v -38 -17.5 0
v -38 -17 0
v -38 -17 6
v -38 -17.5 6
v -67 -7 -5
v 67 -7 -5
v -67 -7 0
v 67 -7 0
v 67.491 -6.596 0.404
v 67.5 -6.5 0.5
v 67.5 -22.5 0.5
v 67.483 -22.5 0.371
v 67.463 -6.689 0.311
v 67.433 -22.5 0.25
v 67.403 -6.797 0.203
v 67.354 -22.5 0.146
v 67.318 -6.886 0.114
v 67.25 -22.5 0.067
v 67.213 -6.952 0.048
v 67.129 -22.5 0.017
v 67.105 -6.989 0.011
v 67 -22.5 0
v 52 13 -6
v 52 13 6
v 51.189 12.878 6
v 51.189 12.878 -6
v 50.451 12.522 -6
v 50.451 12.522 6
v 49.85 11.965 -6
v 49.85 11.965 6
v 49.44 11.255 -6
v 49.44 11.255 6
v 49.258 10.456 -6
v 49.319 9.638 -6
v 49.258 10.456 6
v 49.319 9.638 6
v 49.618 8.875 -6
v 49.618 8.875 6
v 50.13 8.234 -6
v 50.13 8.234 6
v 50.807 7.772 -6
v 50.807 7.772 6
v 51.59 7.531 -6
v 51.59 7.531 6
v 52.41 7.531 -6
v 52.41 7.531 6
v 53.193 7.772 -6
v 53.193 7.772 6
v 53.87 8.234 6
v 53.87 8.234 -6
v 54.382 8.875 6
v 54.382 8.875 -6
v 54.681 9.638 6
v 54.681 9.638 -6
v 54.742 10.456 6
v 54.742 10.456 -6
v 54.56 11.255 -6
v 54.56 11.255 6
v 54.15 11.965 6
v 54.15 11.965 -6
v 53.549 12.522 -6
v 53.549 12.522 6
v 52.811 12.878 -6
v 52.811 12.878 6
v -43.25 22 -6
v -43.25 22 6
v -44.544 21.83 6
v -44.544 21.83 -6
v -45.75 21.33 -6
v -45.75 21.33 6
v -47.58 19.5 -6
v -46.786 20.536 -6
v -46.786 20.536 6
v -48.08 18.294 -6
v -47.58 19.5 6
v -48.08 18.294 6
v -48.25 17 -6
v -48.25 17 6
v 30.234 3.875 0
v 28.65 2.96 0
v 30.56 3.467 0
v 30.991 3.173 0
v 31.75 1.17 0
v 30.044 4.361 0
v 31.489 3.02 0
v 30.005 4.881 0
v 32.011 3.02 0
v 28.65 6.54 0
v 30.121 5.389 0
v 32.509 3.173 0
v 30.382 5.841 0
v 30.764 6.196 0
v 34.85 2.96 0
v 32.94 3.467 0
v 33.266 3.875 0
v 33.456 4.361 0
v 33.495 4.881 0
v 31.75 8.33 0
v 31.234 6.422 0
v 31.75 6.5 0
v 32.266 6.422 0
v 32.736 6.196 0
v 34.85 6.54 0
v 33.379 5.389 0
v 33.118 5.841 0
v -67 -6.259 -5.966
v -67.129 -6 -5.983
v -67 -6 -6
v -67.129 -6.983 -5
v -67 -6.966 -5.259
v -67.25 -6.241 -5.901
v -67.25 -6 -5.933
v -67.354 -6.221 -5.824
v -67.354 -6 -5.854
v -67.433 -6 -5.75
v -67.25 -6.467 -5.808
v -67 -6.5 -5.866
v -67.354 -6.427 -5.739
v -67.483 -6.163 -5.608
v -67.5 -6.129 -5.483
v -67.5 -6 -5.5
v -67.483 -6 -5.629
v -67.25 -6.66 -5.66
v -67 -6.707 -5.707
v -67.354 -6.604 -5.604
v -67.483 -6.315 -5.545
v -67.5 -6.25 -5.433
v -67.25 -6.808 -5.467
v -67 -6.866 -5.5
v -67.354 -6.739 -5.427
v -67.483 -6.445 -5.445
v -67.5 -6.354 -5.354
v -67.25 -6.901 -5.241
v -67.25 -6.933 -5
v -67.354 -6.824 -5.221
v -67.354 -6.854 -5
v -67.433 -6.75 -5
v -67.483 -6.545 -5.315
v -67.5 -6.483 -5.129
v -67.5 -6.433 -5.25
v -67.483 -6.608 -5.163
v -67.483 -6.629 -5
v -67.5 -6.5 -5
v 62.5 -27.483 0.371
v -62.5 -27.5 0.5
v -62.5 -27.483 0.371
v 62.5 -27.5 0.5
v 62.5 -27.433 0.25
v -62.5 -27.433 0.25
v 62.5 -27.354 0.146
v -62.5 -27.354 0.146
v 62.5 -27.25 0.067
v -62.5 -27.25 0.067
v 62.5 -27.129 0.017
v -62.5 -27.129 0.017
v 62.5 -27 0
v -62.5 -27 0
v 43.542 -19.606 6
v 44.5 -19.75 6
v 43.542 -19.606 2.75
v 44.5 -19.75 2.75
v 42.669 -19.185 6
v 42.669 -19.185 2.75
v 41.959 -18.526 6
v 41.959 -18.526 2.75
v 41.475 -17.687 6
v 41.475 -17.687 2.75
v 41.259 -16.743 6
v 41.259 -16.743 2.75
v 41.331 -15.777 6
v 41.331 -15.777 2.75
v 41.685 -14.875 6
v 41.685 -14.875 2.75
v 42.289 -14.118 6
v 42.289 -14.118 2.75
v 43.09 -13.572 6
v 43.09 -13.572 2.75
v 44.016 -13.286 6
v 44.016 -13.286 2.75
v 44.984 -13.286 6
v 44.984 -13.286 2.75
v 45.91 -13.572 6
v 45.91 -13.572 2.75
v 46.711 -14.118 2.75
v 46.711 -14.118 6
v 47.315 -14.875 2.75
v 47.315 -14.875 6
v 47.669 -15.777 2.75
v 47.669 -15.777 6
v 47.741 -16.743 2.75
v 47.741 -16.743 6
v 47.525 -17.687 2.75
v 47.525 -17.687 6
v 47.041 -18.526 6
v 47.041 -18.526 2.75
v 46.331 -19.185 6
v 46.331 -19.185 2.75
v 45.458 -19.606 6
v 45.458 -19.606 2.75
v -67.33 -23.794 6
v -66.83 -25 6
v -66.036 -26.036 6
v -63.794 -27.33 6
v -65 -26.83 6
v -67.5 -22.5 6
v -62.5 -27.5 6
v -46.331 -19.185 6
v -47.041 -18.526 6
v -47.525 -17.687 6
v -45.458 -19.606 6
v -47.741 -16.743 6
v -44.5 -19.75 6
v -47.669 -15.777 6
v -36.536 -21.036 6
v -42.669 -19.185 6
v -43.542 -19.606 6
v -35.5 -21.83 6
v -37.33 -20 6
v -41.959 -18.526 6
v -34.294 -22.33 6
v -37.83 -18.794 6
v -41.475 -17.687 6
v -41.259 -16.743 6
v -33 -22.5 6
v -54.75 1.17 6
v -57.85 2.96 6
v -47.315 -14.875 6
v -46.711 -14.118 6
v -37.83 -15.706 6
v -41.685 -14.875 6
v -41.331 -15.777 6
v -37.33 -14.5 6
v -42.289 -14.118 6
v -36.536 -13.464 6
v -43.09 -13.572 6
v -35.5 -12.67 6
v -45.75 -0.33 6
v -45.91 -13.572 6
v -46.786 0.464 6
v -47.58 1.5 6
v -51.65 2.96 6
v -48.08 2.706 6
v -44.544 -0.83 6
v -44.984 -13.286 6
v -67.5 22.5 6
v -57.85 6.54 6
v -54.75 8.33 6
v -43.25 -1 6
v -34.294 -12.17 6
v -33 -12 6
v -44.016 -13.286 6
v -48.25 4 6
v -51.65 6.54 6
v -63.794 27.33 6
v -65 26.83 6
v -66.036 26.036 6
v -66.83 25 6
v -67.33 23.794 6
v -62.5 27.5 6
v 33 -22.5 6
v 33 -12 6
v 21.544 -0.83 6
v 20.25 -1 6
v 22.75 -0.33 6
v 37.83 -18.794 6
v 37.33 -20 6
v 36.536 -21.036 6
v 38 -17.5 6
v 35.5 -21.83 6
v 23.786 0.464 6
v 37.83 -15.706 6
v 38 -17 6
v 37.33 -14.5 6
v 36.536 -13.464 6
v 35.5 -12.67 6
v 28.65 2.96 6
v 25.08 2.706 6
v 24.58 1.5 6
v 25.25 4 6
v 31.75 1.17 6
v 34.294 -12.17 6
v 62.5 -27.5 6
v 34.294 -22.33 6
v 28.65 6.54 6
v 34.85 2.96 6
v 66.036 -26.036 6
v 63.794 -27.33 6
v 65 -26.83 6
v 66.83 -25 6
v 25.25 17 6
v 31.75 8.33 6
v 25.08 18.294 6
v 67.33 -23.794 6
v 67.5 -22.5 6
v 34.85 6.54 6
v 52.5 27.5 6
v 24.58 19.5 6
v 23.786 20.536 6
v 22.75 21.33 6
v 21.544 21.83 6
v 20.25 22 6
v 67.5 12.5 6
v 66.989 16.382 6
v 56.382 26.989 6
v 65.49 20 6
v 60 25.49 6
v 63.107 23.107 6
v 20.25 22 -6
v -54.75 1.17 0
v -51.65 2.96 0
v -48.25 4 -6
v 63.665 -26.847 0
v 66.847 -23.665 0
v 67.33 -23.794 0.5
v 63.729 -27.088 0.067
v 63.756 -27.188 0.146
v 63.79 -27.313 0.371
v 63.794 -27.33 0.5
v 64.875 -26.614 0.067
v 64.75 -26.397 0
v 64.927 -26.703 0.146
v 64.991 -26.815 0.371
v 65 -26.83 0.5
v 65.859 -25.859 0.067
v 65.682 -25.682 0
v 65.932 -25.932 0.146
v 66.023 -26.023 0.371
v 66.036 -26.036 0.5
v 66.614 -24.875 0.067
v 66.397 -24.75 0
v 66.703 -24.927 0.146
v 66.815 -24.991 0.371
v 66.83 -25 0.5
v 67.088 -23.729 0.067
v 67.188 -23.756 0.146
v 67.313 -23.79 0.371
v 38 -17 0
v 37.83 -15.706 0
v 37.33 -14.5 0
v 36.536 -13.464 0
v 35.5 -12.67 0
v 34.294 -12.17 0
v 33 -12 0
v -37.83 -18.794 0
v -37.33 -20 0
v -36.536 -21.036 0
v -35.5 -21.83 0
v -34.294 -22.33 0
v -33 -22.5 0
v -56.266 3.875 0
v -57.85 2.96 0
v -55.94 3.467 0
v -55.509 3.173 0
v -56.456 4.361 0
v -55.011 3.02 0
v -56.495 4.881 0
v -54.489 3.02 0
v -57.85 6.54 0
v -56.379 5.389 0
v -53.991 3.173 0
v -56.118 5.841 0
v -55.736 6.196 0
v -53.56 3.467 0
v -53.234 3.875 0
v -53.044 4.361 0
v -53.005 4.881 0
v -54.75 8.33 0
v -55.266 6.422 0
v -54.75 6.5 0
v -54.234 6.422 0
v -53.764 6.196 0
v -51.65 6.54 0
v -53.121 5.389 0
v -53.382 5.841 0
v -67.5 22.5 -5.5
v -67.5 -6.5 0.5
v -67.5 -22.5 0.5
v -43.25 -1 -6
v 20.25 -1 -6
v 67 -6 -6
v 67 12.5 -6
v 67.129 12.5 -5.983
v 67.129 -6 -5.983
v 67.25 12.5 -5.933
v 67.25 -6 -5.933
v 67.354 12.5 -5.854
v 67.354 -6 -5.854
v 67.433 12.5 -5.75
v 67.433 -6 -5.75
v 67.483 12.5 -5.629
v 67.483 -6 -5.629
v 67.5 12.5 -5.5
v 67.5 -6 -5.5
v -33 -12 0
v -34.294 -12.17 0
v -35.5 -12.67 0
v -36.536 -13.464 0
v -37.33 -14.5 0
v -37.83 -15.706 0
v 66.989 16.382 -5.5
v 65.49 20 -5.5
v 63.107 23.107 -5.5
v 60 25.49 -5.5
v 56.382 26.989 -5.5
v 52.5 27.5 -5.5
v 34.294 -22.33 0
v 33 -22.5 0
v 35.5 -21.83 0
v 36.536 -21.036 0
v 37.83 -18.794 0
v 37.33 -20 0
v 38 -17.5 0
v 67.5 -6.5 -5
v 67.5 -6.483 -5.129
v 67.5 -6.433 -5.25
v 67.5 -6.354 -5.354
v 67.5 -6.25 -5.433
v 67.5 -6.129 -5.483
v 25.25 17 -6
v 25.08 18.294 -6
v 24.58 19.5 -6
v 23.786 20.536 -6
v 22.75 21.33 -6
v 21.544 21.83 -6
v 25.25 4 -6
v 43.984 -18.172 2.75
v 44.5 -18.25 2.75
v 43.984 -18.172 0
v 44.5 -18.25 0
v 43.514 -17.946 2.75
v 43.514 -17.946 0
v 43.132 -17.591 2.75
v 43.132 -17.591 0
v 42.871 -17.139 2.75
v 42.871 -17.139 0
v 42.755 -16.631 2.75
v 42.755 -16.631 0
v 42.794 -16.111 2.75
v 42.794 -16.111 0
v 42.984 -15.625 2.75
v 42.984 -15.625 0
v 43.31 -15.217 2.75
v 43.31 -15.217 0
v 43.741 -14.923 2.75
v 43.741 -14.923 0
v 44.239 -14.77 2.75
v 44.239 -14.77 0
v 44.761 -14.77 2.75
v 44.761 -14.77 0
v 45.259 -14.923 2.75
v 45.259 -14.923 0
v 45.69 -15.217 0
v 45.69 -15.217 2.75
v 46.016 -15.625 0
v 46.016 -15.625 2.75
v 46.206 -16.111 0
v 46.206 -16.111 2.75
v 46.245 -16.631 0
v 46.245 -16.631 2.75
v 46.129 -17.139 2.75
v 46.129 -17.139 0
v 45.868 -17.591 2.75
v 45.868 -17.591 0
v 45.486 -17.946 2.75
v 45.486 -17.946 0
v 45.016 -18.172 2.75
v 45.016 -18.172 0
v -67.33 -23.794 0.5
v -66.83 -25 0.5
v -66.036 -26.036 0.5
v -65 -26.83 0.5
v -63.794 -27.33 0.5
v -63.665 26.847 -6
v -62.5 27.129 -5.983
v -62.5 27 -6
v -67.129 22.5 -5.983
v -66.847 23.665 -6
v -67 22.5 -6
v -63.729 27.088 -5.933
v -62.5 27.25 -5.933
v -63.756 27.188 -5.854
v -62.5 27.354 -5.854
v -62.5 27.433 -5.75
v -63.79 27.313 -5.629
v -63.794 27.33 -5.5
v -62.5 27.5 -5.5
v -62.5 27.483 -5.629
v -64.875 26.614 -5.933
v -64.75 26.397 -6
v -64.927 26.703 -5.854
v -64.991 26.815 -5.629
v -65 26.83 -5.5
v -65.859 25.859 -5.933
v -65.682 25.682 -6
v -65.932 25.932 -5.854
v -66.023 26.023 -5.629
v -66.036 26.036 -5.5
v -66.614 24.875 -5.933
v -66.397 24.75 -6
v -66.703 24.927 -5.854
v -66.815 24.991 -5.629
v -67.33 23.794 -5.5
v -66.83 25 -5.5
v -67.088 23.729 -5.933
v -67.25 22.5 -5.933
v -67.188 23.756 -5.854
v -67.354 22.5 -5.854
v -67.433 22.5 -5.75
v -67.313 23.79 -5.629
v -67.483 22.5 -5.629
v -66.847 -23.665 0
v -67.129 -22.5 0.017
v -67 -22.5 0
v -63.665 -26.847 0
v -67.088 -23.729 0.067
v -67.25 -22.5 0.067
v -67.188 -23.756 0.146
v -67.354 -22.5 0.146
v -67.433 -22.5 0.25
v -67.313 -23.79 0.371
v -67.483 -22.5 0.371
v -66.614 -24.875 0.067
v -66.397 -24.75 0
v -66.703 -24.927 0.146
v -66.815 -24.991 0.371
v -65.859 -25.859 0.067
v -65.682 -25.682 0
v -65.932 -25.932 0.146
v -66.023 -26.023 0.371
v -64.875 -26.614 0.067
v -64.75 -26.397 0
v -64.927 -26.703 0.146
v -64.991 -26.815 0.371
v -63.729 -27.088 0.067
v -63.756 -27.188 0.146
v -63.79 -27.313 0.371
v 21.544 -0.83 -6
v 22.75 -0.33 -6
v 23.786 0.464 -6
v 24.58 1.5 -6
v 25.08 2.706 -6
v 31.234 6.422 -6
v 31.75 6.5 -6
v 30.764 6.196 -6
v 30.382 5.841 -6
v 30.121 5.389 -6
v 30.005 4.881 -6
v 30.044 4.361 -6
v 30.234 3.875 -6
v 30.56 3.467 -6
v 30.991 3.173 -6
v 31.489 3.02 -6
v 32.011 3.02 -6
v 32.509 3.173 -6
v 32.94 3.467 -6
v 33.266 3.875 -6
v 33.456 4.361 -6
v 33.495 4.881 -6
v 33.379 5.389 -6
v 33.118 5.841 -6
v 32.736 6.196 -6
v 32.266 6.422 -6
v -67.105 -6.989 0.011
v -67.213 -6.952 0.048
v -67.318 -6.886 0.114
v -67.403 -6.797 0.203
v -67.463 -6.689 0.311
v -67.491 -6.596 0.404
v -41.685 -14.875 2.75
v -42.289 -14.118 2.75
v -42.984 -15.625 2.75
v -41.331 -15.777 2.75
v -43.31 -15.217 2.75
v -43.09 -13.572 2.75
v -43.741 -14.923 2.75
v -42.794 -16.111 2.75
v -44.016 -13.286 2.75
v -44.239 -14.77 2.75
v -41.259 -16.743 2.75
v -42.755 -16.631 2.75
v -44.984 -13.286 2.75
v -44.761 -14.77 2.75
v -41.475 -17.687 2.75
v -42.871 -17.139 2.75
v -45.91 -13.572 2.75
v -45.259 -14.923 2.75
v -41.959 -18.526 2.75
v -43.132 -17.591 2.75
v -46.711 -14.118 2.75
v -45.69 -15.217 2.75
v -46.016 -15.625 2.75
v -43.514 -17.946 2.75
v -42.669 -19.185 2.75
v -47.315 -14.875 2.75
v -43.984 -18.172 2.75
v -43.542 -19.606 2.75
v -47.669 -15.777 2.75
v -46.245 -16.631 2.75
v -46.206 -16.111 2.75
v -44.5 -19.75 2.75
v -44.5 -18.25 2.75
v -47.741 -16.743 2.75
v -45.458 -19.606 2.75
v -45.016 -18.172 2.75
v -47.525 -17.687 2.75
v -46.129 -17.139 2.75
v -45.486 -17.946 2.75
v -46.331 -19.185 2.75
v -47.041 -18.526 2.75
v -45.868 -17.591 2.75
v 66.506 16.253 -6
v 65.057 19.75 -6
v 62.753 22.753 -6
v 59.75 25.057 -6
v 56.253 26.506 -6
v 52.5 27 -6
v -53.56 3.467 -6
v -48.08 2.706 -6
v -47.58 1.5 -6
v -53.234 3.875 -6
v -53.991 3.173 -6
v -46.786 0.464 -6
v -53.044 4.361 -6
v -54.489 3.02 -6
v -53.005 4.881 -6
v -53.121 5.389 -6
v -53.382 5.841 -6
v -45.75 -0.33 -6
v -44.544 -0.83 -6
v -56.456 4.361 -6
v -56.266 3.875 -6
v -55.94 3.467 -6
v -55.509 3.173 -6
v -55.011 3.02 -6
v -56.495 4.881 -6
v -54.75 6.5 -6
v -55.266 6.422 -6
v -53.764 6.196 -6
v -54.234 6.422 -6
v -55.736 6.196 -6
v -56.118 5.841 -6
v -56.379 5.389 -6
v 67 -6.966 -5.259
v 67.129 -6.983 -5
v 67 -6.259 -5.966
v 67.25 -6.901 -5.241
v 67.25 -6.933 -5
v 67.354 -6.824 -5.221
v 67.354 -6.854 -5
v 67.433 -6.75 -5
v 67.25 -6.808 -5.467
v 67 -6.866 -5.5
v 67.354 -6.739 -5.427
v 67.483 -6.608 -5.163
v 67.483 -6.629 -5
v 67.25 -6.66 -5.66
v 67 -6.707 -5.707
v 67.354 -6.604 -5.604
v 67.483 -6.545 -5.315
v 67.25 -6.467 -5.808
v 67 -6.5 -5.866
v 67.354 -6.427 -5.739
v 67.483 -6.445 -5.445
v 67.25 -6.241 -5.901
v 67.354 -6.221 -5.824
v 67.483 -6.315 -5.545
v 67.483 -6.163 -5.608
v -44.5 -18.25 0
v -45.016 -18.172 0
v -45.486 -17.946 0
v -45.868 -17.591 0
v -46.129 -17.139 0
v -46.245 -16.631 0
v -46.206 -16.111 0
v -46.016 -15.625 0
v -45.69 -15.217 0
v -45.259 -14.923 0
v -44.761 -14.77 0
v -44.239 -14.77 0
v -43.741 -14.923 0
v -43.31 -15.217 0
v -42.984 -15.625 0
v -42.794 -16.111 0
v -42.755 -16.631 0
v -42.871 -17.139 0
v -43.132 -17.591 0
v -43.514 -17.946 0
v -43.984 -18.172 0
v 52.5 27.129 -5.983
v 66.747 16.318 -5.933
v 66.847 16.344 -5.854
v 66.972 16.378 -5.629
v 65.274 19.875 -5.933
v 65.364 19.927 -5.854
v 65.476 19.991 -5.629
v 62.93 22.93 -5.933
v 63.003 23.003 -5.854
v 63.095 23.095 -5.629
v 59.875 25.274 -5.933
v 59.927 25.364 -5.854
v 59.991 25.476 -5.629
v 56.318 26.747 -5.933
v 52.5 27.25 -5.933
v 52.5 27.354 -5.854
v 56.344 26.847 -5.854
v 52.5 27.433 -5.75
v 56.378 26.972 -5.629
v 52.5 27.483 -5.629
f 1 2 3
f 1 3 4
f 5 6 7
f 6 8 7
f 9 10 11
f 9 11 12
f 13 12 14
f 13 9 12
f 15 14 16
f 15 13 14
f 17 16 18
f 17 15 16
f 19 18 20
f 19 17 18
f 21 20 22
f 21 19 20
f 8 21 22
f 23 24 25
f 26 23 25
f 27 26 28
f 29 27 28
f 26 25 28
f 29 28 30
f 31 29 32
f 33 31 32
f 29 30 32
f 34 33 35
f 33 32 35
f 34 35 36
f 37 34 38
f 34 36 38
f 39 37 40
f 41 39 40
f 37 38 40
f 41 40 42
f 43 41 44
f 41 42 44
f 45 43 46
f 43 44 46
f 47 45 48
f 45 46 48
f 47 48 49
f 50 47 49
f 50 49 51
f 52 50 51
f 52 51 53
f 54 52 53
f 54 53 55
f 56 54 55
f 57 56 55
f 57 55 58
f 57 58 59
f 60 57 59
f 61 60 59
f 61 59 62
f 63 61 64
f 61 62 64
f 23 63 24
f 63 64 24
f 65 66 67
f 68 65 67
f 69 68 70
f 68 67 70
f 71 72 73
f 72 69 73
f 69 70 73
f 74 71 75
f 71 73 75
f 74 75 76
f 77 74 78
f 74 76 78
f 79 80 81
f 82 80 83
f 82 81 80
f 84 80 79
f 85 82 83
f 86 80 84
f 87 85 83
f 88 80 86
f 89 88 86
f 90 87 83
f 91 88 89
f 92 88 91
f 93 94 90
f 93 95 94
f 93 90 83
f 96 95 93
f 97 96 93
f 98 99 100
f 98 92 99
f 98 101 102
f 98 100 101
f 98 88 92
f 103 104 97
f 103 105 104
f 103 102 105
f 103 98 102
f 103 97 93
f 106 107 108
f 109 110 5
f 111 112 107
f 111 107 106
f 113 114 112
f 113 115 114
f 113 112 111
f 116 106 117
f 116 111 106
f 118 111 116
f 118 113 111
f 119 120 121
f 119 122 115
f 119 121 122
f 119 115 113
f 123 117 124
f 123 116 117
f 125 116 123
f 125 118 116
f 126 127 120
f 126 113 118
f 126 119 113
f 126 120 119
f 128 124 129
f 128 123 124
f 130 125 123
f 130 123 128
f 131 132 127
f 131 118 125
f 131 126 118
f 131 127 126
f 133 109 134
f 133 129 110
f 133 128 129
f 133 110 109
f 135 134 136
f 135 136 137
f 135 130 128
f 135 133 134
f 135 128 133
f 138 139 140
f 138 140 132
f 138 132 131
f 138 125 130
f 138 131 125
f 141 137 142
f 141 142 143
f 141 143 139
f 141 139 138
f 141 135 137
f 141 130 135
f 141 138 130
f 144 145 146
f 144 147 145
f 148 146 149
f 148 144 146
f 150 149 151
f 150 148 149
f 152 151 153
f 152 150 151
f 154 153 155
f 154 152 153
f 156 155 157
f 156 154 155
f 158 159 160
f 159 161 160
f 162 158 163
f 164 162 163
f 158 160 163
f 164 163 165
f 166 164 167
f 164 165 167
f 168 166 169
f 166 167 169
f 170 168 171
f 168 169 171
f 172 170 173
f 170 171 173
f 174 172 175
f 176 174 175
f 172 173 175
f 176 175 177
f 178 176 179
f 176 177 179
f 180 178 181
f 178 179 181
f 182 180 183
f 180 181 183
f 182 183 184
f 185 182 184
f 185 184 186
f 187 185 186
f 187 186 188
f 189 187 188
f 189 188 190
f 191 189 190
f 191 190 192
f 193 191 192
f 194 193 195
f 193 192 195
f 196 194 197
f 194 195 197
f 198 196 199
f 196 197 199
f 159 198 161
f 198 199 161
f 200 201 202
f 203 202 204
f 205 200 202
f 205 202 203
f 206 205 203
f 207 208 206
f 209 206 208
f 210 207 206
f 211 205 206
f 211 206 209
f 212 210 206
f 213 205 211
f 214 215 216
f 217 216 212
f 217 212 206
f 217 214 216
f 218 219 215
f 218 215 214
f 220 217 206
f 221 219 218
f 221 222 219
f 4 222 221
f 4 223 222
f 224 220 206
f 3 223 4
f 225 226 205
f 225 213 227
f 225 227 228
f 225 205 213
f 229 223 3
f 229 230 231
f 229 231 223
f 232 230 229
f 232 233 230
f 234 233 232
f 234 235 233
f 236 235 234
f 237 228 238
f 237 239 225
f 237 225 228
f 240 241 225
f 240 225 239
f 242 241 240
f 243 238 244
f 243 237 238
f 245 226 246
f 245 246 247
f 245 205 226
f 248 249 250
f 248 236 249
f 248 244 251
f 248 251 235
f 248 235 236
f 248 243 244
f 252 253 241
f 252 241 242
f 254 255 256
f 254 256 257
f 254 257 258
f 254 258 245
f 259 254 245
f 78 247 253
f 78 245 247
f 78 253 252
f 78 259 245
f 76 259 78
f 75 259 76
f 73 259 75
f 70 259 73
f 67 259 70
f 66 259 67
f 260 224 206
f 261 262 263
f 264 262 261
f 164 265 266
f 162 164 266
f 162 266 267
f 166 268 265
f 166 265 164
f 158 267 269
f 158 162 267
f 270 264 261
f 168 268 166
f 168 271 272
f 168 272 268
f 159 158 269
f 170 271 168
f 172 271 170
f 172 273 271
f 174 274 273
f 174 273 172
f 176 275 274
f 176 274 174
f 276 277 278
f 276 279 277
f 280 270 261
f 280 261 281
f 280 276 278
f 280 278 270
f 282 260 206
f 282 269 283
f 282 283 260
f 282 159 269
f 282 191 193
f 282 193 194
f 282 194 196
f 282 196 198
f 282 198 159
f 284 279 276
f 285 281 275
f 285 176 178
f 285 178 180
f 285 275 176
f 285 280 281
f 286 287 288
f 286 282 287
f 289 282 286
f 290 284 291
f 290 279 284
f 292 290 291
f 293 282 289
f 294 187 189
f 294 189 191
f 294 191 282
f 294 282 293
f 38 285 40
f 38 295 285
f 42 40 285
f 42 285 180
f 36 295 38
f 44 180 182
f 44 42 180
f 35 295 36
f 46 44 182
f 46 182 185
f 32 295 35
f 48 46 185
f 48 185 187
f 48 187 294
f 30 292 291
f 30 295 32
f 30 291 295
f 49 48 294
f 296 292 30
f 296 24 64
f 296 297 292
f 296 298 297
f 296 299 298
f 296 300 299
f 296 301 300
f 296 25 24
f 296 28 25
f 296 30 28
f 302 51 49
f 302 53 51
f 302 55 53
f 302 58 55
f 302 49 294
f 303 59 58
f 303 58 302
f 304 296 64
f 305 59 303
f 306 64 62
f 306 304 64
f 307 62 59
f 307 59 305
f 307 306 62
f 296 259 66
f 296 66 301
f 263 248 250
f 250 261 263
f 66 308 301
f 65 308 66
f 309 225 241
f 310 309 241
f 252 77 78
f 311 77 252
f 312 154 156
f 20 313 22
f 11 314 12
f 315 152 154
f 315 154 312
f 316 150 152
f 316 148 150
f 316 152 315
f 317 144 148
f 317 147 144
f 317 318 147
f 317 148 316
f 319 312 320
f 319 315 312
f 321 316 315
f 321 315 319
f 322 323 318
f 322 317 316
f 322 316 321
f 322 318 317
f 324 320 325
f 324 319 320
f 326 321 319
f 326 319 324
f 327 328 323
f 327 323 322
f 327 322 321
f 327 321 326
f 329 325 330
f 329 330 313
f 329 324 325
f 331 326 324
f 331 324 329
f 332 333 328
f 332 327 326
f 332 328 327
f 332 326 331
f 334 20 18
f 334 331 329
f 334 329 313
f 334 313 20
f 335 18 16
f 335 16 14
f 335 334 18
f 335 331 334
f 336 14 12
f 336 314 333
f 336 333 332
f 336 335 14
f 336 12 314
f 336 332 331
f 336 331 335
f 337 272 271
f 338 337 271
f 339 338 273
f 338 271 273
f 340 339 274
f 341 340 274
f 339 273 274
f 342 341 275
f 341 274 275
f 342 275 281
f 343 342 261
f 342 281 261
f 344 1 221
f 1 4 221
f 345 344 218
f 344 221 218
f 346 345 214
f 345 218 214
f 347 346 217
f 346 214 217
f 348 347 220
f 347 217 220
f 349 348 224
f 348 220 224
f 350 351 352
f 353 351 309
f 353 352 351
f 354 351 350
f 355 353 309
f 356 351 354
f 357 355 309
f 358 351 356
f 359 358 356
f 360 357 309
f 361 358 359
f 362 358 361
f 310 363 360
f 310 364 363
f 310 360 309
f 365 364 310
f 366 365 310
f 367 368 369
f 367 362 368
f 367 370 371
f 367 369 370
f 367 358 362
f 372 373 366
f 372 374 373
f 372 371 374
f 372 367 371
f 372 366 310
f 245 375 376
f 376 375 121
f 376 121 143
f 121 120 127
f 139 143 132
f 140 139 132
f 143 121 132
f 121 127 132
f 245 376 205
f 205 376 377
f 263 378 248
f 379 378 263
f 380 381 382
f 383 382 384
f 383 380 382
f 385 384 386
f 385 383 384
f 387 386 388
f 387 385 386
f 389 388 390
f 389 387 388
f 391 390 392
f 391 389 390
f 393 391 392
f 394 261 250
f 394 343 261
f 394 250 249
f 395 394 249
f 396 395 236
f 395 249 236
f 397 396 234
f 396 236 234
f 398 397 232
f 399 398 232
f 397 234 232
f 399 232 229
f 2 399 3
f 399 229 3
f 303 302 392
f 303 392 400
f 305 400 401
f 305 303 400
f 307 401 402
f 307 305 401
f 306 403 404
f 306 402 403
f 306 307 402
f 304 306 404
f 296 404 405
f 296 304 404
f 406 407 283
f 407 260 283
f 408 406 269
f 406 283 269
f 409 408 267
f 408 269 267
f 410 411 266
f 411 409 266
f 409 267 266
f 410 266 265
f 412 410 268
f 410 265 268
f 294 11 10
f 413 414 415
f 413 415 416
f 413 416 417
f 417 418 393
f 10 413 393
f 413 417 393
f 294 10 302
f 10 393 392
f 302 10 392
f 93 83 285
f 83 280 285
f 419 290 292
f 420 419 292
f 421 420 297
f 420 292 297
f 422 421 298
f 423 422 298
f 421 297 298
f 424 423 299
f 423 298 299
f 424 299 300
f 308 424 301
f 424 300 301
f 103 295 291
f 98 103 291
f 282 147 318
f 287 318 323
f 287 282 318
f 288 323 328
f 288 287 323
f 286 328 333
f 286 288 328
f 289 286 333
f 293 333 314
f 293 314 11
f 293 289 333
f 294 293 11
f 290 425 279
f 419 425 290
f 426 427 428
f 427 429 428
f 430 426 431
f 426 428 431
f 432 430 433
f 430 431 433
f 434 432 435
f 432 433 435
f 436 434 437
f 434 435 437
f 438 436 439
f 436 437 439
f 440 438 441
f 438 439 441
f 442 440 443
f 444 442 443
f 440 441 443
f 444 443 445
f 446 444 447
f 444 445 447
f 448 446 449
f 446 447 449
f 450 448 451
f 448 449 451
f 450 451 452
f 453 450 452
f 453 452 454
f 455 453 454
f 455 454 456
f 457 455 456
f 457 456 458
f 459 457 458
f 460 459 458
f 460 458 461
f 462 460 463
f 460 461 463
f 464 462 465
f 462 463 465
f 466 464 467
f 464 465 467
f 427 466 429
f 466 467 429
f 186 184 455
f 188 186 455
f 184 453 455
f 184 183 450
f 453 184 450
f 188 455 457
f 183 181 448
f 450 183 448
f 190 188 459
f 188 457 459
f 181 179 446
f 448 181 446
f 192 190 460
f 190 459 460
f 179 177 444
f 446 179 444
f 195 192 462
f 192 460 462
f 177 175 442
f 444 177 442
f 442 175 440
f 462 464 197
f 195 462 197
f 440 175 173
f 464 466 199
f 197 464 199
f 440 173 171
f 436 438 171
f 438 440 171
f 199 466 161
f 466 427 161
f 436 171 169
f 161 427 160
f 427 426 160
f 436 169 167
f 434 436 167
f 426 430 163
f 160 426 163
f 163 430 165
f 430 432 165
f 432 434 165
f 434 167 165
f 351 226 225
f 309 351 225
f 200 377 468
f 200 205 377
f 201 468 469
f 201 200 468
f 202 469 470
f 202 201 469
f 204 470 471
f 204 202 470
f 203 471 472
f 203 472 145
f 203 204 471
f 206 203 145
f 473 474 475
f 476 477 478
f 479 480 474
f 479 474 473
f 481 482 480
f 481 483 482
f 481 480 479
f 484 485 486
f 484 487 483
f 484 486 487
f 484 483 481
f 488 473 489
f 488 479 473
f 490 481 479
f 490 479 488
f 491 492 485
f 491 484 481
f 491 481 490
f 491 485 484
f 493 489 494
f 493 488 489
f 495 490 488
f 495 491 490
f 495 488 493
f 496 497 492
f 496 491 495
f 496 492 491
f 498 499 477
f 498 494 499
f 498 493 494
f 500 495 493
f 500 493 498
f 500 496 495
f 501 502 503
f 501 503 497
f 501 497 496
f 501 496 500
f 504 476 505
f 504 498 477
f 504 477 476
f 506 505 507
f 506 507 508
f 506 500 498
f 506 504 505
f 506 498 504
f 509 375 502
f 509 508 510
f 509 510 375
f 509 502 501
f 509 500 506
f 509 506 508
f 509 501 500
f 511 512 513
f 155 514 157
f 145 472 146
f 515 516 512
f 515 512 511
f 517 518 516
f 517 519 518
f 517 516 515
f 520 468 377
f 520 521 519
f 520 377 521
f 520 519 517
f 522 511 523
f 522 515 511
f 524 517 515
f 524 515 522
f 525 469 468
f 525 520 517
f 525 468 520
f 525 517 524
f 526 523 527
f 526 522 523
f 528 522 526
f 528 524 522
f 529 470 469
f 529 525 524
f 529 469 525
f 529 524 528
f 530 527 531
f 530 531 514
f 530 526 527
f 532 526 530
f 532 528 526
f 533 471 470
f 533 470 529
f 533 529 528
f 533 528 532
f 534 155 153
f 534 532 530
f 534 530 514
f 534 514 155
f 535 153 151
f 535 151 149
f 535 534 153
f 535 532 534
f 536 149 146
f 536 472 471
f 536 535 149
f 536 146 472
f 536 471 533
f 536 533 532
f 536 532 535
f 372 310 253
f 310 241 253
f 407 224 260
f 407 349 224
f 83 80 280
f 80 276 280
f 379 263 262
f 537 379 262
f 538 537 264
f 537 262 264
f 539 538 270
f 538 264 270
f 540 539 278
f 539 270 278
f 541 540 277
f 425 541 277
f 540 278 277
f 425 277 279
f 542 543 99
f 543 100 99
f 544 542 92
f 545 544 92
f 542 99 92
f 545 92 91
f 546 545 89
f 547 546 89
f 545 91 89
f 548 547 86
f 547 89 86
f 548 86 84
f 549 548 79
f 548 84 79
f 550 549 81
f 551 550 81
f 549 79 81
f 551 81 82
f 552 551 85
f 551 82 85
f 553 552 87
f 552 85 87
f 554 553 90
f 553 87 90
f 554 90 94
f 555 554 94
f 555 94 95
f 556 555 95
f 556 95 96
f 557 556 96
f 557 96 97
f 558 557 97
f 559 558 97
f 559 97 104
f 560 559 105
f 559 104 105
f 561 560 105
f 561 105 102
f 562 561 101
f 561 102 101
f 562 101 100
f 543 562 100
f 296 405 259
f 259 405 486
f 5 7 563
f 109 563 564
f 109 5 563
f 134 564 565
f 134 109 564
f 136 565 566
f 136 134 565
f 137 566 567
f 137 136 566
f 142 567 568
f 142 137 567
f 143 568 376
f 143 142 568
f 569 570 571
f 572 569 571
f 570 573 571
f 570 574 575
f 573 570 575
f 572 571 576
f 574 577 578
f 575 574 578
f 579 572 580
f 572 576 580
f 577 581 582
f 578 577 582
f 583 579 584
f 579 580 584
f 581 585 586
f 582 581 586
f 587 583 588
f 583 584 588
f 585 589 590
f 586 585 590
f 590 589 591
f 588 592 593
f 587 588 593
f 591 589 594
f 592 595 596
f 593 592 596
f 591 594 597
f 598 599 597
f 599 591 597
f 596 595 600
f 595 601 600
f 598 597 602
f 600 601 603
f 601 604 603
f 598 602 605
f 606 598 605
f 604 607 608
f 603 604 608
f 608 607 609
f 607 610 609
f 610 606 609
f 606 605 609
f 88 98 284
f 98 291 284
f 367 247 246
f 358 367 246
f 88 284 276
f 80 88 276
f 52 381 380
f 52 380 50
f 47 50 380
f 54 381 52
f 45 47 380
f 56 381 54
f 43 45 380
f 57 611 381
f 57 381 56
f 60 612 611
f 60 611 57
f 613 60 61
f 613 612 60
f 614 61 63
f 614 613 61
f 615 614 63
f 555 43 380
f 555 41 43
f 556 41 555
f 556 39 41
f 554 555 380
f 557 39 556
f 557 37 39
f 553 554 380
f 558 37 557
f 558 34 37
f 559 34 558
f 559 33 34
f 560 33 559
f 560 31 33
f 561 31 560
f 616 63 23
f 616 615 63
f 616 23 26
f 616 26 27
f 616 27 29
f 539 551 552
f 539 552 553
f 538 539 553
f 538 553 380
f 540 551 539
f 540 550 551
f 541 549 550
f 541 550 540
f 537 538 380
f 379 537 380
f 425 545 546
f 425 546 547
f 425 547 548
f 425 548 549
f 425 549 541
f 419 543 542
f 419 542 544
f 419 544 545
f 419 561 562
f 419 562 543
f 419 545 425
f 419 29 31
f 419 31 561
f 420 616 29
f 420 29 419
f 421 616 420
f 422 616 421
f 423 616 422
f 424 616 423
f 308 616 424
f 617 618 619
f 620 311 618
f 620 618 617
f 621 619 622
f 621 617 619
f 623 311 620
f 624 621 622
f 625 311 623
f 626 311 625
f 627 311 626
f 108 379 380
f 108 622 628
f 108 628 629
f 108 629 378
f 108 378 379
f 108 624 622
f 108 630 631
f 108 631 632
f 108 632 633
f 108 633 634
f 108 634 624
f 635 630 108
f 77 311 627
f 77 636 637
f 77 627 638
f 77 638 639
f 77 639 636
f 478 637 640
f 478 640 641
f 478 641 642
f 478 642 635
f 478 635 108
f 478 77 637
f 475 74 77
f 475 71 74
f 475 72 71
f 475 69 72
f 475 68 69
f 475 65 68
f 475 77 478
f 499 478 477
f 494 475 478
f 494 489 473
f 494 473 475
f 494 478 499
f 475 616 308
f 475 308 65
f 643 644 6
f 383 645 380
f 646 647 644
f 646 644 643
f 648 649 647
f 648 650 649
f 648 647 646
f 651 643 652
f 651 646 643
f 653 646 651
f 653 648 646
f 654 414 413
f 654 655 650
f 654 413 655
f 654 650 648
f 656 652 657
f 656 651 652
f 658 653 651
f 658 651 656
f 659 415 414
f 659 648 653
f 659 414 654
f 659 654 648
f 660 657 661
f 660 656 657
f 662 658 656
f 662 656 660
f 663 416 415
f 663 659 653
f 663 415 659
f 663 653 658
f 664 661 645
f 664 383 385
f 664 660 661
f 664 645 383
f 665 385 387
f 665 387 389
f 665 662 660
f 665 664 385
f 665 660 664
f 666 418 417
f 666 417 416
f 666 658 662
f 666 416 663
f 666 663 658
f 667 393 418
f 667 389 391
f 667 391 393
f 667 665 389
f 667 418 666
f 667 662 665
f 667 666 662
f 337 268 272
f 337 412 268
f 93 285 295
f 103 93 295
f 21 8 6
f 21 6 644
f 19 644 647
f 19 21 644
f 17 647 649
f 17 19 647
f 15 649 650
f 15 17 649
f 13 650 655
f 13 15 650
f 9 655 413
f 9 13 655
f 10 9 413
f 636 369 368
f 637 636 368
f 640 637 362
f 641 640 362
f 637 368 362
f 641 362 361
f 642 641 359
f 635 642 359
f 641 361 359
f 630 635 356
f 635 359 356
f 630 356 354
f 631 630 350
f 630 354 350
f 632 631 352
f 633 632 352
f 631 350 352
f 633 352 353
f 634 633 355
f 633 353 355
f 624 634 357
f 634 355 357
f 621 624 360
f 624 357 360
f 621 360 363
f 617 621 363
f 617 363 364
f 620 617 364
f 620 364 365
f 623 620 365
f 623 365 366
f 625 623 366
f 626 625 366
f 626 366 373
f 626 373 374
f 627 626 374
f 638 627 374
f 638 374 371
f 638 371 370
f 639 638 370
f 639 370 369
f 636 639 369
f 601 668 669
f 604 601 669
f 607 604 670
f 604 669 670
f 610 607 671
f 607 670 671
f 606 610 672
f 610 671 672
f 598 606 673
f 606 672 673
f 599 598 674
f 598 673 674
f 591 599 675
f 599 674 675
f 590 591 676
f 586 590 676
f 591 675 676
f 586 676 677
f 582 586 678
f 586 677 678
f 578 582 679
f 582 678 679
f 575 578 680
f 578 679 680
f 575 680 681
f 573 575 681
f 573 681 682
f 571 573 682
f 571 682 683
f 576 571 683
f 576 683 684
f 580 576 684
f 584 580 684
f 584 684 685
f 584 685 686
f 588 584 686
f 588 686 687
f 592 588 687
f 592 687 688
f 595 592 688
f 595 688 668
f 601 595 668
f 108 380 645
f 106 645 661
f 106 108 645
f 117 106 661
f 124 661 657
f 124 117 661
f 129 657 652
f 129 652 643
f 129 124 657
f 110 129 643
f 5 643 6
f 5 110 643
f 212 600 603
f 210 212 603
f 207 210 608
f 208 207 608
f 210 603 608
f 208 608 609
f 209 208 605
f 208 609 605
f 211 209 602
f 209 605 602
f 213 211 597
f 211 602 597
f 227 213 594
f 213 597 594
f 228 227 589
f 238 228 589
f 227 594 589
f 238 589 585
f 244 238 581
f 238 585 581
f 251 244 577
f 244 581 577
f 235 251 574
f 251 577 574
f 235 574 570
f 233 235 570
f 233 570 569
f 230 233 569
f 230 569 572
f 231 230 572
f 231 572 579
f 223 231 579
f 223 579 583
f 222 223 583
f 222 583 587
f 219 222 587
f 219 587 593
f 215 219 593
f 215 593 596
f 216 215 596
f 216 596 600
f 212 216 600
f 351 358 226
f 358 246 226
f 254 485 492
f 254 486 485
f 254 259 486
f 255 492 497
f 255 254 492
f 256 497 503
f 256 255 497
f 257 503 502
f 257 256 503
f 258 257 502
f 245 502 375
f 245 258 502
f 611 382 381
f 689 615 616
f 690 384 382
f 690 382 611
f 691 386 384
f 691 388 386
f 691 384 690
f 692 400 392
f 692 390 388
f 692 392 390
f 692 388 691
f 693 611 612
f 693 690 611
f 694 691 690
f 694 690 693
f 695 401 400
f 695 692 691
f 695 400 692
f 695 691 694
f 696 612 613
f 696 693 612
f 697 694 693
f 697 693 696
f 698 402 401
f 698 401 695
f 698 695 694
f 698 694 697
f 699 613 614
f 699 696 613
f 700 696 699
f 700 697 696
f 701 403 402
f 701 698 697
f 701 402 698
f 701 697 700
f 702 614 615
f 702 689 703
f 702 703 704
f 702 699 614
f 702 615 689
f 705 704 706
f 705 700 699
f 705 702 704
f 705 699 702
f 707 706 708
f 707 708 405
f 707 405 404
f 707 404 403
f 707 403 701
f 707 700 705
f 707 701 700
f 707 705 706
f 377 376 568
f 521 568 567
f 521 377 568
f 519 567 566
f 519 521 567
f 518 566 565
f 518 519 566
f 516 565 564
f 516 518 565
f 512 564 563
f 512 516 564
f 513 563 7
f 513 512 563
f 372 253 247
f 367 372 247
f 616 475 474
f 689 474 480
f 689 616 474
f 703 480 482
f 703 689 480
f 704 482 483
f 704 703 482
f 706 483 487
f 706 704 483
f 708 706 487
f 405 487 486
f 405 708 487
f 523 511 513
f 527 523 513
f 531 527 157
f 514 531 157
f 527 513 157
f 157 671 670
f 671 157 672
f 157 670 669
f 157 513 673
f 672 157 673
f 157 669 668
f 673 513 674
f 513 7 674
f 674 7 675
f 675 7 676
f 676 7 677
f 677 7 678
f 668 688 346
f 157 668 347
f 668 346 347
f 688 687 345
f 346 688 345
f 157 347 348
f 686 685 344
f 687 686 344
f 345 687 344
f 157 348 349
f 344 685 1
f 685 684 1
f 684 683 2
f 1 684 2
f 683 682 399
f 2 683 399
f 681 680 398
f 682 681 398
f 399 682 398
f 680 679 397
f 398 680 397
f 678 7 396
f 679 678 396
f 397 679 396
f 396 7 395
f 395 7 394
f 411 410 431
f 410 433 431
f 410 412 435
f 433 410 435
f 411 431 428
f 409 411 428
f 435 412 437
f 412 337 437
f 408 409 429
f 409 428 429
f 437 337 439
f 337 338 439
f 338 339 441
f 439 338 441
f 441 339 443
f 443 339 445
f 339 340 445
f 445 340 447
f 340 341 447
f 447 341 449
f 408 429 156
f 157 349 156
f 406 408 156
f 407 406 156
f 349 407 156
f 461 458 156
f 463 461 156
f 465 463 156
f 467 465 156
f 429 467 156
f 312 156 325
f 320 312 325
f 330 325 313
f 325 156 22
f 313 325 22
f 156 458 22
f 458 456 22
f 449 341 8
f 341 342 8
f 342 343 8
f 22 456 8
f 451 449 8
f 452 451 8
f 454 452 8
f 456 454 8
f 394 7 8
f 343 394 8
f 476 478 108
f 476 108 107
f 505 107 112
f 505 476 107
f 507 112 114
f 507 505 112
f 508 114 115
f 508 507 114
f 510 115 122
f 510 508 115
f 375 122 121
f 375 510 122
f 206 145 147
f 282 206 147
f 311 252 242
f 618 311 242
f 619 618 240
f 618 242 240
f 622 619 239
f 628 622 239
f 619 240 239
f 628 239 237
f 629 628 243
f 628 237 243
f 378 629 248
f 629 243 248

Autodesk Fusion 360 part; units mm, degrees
sketch "Sketch1" plane through (0, 0, 0) normal (0, 0, 1) x (1, 0, 0)
  line L0 (67.5, 27.5) -> (-67.5, 27.5)
  line L1 (-67.5, 27.5) -> (-67.5, -27.5)
  line L2 (-67.5, -27.5) -> (67.5, -27.5)
  line L3 (67.5, -27.5) -> (67.5, 27.5)
  line L4 (67.5, 27.5) -> (-67.5, -27.5) construction
  line L5 (-67.5, 27.5) -> (67.5, -27.5) construction
  dimension "d1" = 55
  dimension "d2" = 135
extrude "Extrude1" add sketch "Sketch1" along normal blind 6
sketch "Sketch3" plane through (0, 0, 0) normal (0, 0, -1) x (-1, 0, 0)
  line L0 (-67.5, 27.5) -> (-67.5, -27.5)
  line L1 (-67.5, -27.5) -> (67.5, -27.5)
  line L2 (67.5, -27.5) -> (67.5, 27.5)
  line L3 (67.5, 27.5) -> (-67.5, 27.5)
  line L4 (-67.5, -7) -> (67.5, -7)
  line L5 (67.5, -7) -> (67.5, 27.5)
  line L6 (67.5, 27.5) -> (-67.5, 27.5)
  line L7 (-67.5, 27.5) -> (-67.5, -7)
  line L8 (-67.5, -7) -> (67.5, 27.5) construction
  line L9 (67.5, -7) -> (-67.5, 27.5) construction
  point P0 (0, 10.25)
  dimension "d14" = 34.5
  dimension "d30" = 20.5
extrude "Extrude2" add sketch "Sketch3" along normal blind 6 contours L0 L2 L3 L4 L5 L6 L7
sketch "Sketch2" plane through (0, 0, 6) normal (0, 0, 1) x (1, 0, 0)
  line L0 (67.5, -27.5) -> (67.5, 27.5)
  line L1 (67.5, 27.5) -> (-67.5, 27.5)
  line L2 (-67.5, 27.5) -> (-67.5, -27.5)
  line L3 (-67.5, -27.5) -> (67.5, -27.5)
  line L4 (67.5, -7) -> (-67.5, -7)
  point P0 (-44.5, -16.5)
  point P1 (44.5, -16.5)
  dimension "d7" = 23
  dimension "d47" = 9.5
  dimension "d48" = 9.5
  dimension "d49" = 89
hole "Hole1" at (-44.5, -16.5, 6) at (44.5, -16.5, 6) direction (0, 0, -1) diameter 3.5 end through all counterbore diameter 6.5 counterbore depth 3.25
sketch "Sketch4" plane through (0, 0, -6) normal (0, 0, -1) x (-1, 0, 0)
  line L0 (-67.5, 27.5) -> (-67.5, -7)
  line L1 (-67.5, -7) -> (67.5, -7)
  line L2 (67.5, -7) -> (67.5, 27.5)
  line L3 (67.5, 27.5) -> (-67.5, 27.5)
  line L4 (-67.5, 4.75) -> (67.5, 4.75) construction
  point P0 (54.75, 4.75)
  point P1 (-31.75, 4.75)
  dimension "d19" = 12.75
  dimension "d20" = 86.5
  dimension "d31" = 11.75
hole "Hole2" at (31.75, 4.75, -6) at (-54.75, 4.75, -6) direction (0, 0, 1) diameter 3.5 end through all
sketch "Sketch5" plane through (0, 0, 6) normal (0, 0, 1) x (1, 0, 0)
  circle A0 centre (31.75, 4.75) radius 1.75
  circle A1 centre (-54.75, 4.75) radius 1.75
  circle A2 centre (-44.5, -16.5) radius 3.25
  circle A3 centre (44.5, -16.5) radius 3.25
  line L0 (67.5, -27.5) -> (67.5, 27.5)
  line L1 (67.5, 27.5) -> (-67.5, 27.5)
  line L2 (-67.5, 27.5) -> (-67.5, -27.5)
  line L3 (-67.5, -27.5) -> (67.5, -27.5)
  line L4 (-51.65, 6.5398) -> (-54.75, 8.3296)
  line L5 (-54.75, 8.3296) -> (-57.85, 6.5398)
  line L6 (-57.85, 6.5398) -> (-57.85, 2.9602)
  line L7 (-57.85, 2.9602) -> (-54.75, 1.1704)
  line L8 (-54.75, 1.1704) -> (-51.65, 2.9602)
  line L9 (-51.65, 2.9602) -> (-51.65, 6.5398)
  line L10 (34.85, 2.9602) -> (34.85, 6.5398)
  line L11 (34.85, 6.5398) -> (31.75, 8.3296)
  line L12 (31.75, 8.3296) -> (28.65, 6.5398)
  line L13 (28.65, 6.5398) -> (28.65, 2.9602)
  line L14 (28.65, 2.9602) -> (31.75, 1.1704)
  line L15 (31.75, 1.1704) -> (34.85, 2.9602)
  point P0 (-54.75, 4.75)
  point P1 (31.75, 4.75)
  dimension "d24" = 6.2
  dimension "d25" = 6.2
extrude "Extrude3" cut sketch "Sketch5" against normal blind 6 contours L4 L5 L6 L7 L8 L9 | L10 L11 L12 L13 L14 L15
sketch "Sketch6" plane through (0, 0, -6) normal (0, 0, -1) x (-1, 0, 0)
  circle A0 centre (-31.75, 4.75) radius 1.75
  circle A1 centre (54.75, 4.75) radius 1.75
  line L0 (-67.5, 27.5) -> (-67.5, -7)
  line L1 (-67.5, -7) -> (67.5, -7)
  line L2 (67.5, -7) -> (67.5, 27.5)
  line L3 (67.5, 27.5) -> (-67.5, 27.5)
  line L4 (59.5, -7) -> (-36.5, -7) construction
  line L5 (-36.5, -7) -> (-36.5, 28) construction
  line L6 (-36.5, 28) -> (59.5, 28) construction
  line L7 (59.5, 28) -> (59.5, -7) construction
  line L8 (59.5, -7) -> (-36.5, 28) construction
  line L9 (-36.5, -7) -> (59.5, 28) construction
  line L10 (11.5, 50.5144) -> (11.5, -41.0982) construction
  line L11 (-52, 27.5) -> (-52, -7) construction
  line L12 (-36.5, 10.25) -> (-67.5, 10.25) construction
  point P0 (11.5, 10.5)
  point P1 (-52, 10.25)
  dimension "d28" = 35
  dimension "d29" = 96
hole "Hole3" at (52, 10.25, -6) direction (0, 0, 1) diameter 5.5 end through all
fillet "Fillet1" radius 5 2 edges at (67.5, -27.5, 3) (-67.5, -27.5, 3)
fillet "Fillet1" radius 5 1 edges at (-67.5, 27.5, 0)
fillet "Fillet3" radius 15 1 edges at (67.5, 27.5, 0)
fillet "Fillet4" radius 1 1 edges at (0, -7, -6)
fillet "Fillet5" radius 0.5 14 edges at (-67.5, -14.75, 0) (-66.0355, -26.0355, 0) (0, -27.5, 0) (66.0355, -26.0355, 0) (67.5, -14.75, 0) (-67.5, -7, -2.5) (-67.5, -6.7071, -5.7071) (-67.5, 8.25, -6) (-66.0355, 26.0355, -6) (-5, 27.5, -6) (63.1066, 23.1066, -6) (67.5, 3.25, -6) (67.5, -6.7071, -5.7071) (67.5, -7, -2.5)
sketch "Sketch7" plane through (0, 0, -6) normal (0, 0, -1) x (-1, 0, 0)
  line L0 (-67, 12.5) -> (-67, -6)
  line L1 (-67, -6) -> (67, -6)
  line L2 (67, -6) -> (67, 22.5)
  arc A0 (67, 22.5) -> (62.5, 27) centre (62.5, 22.5) ccw
  line L3 (62.5, 27) -> (-52.5, 27)
  arc A1 (-52.5, 27) -> (-67, 12.5) centre (-52.5, 12.5) ccw
  circle A2 centre (54.75, 4.75) radius 1.75
  circle A3 centre (-31.75, 4.75) radius 1.75
  circle A4 centre (-52, 10.25) radius 2.75
  line L4 (-25.25, 22) -> (48.25, 22)
  line L5 (48.25, 22) -> (48.25, -1)
  line L6 (48.25, -1) -> (-25.25, -1)
  line L7 (-25.25, -1) -> (-25.25, 22)
  line L8 (-25.25, 22) -> (48.25, -1) construction
  line L9 (48.25, 22) -> (-25.25, -1) construction
  point P0 (11.5, 10.5)
  dimension "d50" = 5
  dimension "d51" = 5
  dimension "d52" = 6.5
  dimension "d53" = 6.5
extrude "Extrude4" cut sketch "Sketch7" against normal through all contours L4 L5 L6 L7
fillet "Fillet6" radius 5 4 edges at (25.25, 22, 0) (25.25, -1, 0) (-48.25, -1, 0) (-48.25, 22, 0)
sketch "Sketch8" plane through (0, 0, 0) normal (0, 0, -1) x (-1, 0, 0)
  line L0 (-67, -7) -> (-67, -22.5)
  arc A0 (-67, -22.5) -> (-62.5, -27) centre (-62.5, -22.5) ccw
  line L1 (-62.5, -27) -> (62.5, -27)
  arc A1 (62.5, -27) -> (67, -22.5) centre (62.5, -22.5) ccw
  line L2 (67, -22.5) -> (67, -7)
  line L3 (67, -7) -> (-67, -7)
  circle A2 centre (-44.5, -16.5) radius 1.75
  circle A3 centre (44.5, -16.5) radius 1.75
  line L4 (38, -22.5) -> (-38, -22.5)
  line L5 (-38, -22.5) -> (-38, -12)
  line L6 (-38, -12) -> (38, -12)
  line L7 (38, -12) -> (38, -22.5)
  line L8 (38, -22.5) -> (-38, -12) construction
  line L9 (-38, -22.5) -> (38, -12) construction
  line L10 (-62.5, -27.5) -> (62.5, -27.5)
  point P0 (0, -17.25)
  dimension "d57" = 5
  dimension "d58" = 5
  dimension "d59" = 6.5
  dimension "d60" = 6.5
extrude "Extrude5" cut sketch "Sketch8" against normal through all contours L4 L5 L6 L7
fillet "Fillet7" radius 5 4 edges at (38, -12, 3) (38, -22.5, 3) (-38, -22.5, 3) (-38, -12, 3)
equation "d7 = 21.5 mm + 1.5 mm"
equation "d19 = 15 mm - 2.25 mm"
equation "d20 = 82 mm + 4.5 mm"
equation "d25 = d24"
equation "d31 = 9.5 mm + 2.25 mm"
equation "d51 = d50"
equation "d53 = d52"
equation "d58 = d57"
equation "d60 = d59"
